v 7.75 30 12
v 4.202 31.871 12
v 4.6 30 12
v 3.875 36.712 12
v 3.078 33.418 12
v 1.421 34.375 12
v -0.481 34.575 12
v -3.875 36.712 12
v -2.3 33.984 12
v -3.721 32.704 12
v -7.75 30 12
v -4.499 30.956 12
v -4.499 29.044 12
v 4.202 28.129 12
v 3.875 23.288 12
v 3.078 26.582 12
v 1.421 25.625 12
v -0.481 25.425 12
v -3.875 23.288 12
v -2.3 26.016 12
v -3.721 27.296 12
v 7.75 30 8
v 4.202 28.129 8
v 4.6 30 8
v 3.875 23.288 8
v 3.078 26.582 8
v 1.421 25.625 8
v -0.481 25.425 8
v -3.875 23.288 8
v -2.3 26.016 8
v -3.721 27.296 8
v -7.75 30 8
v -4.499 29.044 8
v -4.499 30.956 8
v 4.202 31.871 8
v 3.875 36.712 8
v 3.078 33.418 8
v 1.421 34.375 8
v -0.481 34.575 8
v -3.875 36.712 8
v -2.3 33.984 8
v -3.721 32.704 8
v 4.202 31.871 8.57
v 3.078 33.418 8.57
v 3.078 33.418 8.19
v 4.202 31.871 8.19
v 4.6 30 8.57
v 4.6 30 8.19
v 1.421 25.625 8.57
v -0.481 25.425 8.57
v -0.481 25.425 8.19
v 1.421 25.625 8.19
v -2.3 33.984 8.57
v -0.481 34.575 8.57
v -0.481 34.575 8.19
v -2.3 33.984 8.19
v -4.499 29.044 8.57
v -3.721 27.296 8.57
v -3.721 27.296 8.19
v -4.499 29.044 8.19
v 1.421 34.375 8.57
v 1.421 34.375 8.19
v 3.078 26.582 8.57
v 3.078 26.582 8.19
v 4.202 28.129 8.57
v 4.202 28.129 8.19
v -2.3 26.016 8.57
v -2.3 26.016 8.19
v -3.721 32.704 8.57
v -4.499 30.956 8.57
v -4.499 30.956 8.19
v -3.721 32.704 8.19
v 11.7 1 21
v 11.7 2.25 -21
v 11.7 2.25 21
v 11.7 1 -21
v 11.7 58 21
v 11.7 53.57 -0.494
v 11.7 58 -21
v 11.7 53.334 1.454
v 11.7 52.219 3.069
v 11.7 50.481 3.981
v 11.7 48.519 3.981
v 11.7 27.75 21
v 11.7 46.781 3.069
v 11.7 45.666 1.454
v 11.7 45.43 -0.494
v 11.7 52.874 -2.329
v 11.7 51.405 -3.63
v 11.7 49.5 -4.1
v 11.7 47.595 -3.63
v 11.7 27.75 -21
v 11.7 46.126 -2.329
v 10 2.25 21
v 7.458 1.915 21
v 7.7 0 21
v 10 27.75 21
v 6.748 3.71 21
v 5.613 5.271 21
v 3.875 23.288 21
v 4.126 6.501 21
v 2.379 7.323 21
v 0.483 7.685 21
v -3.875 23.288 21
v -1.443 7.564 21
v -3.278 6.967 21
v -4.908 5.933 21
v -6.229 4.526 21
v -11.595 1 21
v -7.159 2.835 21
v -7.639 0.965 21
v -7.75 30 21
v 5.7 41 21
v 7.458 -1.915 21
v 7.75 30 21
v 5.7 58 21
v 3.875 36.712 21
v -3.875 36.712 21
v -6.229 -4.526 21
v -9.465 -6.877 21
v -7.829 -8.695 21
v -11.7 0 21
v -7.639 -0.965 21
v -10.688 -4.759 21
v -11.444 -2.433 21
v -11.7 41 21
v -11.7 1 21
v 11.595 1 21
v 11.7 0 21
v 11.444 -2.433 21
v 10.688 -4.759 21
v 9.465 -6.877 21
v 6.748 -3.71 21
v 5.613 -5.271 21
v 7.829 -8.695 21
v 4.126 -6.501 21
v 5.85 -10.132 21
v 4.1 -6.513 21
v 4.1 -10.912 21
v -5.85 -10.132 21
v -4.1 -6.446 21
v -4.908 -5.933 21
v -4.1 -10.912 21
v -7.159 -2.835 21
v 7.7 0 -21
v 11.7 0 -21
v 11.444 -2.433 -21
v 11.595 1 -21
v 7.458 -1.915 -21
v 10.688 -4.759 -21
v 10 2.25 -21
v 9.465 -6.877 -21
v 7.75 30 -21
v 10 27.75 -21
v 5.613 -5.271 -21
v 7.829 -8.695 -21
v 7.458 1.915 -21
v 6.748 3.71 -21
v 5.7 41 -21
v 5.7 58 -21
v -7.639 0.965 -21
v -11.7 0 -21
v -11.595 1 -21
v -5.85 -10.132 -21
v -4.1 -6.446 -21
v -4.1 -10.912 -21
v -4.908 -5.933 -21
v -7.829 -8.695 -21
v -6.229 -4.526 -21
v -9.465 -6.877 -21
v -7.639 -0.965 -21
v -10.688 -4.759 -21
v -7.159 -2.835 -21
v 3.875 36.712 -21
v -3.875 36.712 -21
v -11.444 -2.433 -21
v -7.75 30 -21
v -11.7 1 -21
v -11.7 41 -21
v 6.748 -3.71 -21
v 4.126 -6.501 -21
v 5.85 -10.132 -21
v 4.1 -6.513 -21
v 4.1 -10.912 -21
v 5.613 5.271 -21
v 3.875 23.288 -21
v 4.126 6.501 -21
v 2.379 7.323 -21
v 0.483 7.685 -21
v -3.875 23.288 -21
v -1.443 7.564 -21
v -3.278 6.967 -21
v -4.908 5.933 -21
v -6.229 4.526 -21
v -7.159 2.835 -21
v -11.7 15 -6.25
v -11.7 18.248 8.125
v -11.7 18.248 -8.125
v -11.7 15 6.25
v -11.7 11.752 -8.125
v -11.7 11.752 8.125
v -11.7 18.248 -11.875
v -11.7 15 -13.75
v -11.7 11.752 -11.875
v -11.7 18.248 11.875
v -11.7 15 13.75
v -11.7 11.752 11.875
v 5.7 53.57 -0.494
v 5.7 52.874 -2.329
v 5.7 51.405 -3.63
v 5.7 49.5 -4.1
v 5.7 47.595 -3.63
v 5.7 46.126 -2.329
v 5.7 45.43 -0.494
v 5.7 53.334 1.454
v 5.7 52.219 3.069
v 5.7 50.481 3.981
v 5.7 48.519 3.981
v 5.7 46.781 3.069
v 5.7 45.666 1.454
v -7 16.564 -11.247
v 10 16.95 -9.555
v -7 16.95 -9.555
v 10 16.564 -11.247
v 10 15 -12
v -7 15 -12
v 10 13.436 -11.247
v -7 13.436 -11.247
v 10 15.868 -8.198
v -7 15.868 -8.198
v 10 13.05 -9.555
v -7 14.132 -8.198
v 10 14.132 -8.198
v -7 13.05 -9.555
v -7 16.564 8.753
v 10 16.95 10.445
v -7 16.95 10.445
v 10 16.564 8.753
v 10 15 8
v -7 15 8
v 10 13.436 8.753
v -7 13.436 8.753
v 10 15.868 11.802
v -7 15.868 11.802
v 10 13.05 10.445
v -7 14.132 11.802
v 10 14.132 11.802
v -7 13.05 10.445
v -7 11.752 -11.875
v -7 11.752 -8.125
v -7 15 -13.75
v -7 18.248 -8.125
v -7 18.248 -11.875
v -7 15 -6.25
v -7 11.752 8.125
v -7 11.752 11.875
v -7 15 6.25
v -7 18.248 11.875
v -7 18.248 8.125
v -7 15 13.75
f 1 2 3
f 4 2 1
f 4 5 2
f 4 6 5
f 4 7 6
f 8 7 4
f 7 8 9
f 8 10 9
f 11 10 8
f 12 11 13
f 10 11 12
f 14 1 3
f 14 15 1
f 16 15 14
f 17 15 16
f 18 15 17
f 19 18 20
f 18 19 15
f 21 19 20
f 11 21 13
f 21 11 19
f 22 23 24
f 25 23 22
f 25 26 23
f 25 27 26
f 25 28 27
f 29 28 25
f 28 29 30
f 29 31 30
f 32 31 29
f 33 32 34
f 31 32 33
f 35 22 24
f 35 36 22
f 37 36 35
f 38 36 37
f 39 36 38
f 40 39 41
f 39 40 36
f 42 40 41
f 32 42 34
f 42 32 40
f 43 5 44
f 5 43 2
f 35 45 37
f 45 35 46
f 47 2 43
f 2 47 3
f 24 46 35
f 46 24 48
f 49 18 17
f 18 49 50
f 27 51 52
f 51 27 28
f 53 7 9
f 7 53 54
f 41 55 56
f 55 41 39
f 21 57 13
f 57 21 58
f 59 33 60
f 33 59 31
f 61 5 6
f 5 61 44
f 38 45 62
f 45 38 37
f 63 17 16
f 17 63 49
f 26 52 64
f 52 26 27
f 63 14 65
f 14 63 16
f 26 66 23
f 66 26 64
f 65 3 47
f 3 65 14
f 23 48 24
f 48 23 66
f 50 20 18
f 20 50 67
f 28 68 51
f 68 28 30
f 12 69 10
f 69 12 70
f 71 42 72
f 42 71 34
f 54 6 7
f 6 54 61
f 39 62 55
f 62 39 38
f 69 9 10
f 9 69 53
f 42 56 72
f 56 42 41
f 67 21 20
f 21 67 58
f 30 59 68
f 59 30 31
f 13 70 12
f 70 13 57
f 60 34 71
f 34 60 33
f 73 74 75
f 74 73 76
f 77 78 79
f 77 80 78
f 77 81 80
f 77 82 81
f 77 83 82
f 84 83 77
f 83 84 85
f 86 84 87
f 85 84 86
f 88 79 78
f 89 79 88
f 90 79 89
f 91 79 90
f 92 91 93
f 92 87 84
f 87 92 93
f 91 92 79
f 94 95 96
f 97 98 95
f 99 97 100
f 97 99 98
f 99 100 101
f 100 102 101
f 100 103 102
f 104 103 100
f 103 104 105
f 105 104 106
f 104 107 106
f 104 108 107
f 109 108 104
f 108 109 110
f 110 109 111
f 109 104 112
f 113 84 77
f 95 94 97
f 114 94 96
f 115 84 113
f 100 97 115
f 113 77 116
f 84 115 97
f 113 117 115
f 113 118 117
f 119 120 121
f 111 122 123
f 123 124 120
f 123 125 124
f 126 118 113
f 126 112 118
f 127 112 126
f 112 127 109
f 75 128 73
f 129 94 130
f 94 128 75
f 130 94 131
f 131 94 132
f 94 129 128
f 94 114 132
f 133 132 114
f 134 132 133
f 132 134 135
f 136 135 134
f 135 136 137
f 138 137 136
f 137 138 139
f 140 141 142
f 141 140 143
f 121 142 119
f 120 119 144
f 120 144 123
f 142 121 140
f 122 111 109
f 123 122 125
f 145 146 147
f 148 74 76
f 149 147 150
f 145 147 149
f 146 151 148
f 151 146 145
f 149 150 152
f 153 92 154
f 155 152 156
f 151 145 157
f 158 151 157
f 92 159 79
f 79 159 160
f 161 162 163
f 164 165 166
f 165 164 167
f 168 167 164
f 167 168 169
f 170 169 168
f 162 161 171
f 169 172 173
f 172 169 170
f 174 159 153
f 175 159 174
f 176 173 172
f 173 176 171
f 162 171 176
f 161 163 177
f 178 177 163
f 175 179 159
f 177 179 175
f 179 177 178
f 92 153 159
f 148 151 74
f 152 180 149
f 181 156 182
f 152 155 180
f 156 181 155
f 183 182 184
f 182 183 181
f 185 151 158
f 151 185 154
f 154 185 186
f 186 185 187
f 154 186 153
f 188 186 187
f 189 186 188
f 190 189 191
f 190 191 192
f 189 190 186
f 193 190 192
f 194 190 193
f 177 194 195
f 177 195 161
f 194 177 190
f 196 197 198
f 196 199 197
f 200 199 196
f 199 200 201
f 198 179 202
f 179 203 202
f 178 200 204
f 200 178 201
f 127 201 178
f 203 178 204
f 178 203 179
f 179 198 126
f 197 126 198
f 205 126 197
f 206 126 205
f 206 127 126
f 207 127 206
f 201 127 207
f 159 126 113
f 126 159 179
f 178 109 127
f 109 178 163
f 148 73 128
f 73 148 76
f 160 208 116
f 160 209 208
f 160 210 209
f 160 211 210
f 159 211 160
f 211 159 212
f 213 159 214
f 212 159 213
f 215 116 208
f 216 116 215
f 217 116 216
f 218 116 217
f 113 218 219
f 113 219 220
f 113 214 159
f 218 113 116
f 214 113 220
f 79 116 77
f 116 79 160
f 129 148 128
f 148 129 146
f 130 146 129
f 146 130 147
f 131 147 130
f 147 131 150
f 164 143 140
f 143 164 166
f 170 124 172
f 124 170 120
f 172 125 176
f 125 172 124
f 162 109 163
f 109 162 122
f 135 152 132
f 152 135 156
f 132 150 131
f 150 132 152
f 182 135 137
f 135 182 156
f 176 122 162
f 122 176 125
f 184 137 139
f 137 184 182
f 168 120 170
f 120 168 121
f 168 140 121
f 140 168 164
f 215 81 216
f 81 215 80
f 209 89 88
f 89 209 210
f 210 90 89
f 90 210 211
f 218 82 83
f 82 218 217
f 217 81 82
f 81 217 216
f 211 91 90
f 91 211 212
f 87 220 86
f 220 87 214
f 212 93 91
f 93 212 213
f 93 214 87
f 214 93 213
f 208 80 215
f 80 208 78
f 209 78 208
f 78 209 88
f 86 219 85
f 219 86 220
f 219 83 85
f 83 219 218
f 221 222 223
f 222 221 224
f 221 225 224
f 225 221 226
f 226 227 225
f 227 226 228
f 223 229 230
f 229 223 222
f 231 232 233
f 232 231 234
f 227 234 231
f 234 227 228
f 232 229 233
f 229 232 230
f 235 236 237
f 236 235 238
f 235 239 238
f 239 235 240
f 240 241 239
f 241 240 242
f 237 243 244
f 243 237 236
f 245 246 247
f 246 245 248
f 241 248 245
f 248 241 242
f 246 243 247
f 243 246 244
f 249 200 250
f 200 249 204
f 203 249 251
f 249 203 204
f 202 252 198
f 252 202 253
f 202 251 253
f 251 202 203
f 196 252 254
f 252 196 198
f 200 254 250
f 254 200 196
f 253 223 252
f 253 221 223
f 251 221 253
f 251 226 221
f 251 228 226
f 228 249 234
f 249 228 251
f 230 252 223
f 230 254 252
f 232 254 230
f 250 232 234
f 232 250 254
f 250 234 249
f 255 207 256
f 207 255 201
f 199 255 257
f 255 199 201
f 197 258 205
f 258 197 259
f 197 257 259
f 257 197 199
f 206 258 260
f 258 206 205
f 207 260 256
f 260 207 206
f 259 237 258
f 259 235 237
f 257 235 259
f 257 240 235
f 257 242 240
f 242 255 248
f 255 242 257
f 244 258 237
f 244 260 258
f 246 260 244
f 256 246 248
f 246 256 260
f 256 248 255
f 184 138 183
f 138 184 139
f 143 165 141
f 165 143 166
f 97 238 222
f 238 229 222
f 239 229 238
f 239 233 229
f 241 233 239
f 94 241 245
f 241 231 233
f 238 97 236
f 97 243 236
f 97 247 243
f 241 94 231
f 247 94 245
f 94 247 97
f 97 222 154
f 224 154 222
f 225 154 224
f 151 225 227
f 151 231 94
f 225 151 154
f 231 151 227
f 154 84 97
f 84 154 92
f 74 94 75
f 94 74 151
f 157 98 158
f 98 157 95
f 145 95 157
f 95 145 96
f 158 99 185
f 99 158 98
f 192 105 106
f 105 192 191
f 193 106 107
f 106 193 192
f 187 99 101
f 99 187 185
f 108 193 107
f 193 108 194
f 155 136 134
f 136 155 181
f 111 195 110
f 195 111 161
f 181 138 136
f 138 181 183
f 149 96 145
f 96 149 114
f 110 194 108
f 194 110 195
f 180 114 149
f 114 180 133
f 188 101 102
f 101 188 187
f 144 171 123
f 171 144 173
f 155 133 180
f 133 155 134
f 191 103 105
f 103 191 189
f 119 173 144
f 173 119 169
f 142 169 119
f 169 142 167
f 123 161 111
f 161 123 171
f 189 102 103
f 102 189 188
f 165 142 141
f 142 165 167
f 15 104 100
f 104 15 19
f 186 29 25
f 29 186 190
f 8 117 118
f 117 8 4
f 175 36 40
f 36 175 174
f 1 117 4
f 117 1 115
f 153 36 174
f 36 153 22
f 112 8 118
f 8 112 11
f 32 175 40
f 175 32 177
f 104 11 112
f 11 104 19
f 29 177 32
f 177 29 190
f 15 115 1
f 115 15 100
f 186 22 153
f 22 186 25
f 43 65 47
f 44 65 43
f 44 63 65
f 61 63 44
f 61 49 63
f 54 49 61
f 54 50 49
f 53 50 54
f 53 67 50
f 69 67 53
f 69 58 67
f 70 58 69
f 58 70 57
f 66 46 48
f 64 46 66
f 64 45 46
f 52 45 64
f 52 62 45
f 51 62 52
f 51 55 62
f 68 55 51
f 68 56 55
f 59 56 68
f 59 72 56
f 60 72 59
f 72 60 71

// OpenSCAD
// file: Rook_Config.scad
// Rook 3D Printer Configuration
// Created By Jeffrey Olijar 
// Jolijar@gmail.com

// Layer Height
LH = 0.38;

// 608 skate bearing
Bearing_OD = 22.5; 
Bearing_ID = 8;
Bearing_H = 7;

// M3 Nut Diameter
N3 = 7.5;

// M4 Screw Hole Diameter
M4 = 4;

// M5 Screw Hole Diameter
M5 = 5.4;

// M8 Rod Diameter (configure for a tight fit)
M8 = 8.2;

// M8 Nut Diameter
N8 = 15.5;

//LM8UU Bearing
LBD = 15.4; // Diameter
LBH = 25; // Height
LBI = 8;  // Inner Diameter

//Makergear Groovemount
GVO = 16.5; // Outside Diameter
GVI = 12.5;  // Inside Groove Diameter

// Distance Between Centers for X rods
DBCX = 70;
// main file
// Rook 3D Printer 
// X Idler
// Created By Jeffrey Olijar 
// Jolijar@gmail.com
// Revision 1.00
// 1 x required 

include <Rook_Config.scad> 


module Rook_X_Idler(){
translate(v=[0,30,8+LH]){ 
cube(size = [LBD+4,20,LH], center = true);
}
translate(v=[0,30,10]){ 
difference(){ 
union(){
cube(size = [LBD+4,20,4], center = true);
}
union(){
translate(v=[0,0,0]){ 
cylinder(h=42,r=M8/2+0.5, center = true);
}
}
}
}







difference(){ 
union(){


translate(v=[0,21,0]){ 
cube(size = [LBD+8,40,42], center = true);
}
translate(v=[LBD/2+1,46,0]){ 
cube(size = [6,24,42], center = true);
}
	
	cylinder(h=42,r=LBD/2+4, center = true);

}
union(){
translate(v=[0,-M8,0]){ 
cube(size = [M8,20,42], center = true);
}

rotate(a=[0,90,0])translate(v=[0,63,0]){ 
translate(v=[0,-13.5,0]){ 
cylinder(h=43,r=M8/2, center = true);
}
translate(v=[10,-48,-20]){
cylinder(h=50,r=M4/2);
}
translate(v=[-10,-48,-20]){
cylinder(h=50,r=M4/2);
}
translate(v=[10,-48,-32]){
cylinder(h=50,r=N3/2,$fn=6, center = true);
}
translate(v=[-10,-48,-32]){
cylinder(h=50,r=N3/2,$fn=6, center = true);
}
}







//x rod cutout
translate(v=[20,15,0]){ 
cube(size = [20,25.5,42], center = true);
}








	cylinder(h=43,r=LBD/2, center = true);
translate(v=[0,30,0]){ 
		cylinder(h=43,r=N8/2,$fn=6, center = true);
}


}

}






}











Rook_X_Idler();
